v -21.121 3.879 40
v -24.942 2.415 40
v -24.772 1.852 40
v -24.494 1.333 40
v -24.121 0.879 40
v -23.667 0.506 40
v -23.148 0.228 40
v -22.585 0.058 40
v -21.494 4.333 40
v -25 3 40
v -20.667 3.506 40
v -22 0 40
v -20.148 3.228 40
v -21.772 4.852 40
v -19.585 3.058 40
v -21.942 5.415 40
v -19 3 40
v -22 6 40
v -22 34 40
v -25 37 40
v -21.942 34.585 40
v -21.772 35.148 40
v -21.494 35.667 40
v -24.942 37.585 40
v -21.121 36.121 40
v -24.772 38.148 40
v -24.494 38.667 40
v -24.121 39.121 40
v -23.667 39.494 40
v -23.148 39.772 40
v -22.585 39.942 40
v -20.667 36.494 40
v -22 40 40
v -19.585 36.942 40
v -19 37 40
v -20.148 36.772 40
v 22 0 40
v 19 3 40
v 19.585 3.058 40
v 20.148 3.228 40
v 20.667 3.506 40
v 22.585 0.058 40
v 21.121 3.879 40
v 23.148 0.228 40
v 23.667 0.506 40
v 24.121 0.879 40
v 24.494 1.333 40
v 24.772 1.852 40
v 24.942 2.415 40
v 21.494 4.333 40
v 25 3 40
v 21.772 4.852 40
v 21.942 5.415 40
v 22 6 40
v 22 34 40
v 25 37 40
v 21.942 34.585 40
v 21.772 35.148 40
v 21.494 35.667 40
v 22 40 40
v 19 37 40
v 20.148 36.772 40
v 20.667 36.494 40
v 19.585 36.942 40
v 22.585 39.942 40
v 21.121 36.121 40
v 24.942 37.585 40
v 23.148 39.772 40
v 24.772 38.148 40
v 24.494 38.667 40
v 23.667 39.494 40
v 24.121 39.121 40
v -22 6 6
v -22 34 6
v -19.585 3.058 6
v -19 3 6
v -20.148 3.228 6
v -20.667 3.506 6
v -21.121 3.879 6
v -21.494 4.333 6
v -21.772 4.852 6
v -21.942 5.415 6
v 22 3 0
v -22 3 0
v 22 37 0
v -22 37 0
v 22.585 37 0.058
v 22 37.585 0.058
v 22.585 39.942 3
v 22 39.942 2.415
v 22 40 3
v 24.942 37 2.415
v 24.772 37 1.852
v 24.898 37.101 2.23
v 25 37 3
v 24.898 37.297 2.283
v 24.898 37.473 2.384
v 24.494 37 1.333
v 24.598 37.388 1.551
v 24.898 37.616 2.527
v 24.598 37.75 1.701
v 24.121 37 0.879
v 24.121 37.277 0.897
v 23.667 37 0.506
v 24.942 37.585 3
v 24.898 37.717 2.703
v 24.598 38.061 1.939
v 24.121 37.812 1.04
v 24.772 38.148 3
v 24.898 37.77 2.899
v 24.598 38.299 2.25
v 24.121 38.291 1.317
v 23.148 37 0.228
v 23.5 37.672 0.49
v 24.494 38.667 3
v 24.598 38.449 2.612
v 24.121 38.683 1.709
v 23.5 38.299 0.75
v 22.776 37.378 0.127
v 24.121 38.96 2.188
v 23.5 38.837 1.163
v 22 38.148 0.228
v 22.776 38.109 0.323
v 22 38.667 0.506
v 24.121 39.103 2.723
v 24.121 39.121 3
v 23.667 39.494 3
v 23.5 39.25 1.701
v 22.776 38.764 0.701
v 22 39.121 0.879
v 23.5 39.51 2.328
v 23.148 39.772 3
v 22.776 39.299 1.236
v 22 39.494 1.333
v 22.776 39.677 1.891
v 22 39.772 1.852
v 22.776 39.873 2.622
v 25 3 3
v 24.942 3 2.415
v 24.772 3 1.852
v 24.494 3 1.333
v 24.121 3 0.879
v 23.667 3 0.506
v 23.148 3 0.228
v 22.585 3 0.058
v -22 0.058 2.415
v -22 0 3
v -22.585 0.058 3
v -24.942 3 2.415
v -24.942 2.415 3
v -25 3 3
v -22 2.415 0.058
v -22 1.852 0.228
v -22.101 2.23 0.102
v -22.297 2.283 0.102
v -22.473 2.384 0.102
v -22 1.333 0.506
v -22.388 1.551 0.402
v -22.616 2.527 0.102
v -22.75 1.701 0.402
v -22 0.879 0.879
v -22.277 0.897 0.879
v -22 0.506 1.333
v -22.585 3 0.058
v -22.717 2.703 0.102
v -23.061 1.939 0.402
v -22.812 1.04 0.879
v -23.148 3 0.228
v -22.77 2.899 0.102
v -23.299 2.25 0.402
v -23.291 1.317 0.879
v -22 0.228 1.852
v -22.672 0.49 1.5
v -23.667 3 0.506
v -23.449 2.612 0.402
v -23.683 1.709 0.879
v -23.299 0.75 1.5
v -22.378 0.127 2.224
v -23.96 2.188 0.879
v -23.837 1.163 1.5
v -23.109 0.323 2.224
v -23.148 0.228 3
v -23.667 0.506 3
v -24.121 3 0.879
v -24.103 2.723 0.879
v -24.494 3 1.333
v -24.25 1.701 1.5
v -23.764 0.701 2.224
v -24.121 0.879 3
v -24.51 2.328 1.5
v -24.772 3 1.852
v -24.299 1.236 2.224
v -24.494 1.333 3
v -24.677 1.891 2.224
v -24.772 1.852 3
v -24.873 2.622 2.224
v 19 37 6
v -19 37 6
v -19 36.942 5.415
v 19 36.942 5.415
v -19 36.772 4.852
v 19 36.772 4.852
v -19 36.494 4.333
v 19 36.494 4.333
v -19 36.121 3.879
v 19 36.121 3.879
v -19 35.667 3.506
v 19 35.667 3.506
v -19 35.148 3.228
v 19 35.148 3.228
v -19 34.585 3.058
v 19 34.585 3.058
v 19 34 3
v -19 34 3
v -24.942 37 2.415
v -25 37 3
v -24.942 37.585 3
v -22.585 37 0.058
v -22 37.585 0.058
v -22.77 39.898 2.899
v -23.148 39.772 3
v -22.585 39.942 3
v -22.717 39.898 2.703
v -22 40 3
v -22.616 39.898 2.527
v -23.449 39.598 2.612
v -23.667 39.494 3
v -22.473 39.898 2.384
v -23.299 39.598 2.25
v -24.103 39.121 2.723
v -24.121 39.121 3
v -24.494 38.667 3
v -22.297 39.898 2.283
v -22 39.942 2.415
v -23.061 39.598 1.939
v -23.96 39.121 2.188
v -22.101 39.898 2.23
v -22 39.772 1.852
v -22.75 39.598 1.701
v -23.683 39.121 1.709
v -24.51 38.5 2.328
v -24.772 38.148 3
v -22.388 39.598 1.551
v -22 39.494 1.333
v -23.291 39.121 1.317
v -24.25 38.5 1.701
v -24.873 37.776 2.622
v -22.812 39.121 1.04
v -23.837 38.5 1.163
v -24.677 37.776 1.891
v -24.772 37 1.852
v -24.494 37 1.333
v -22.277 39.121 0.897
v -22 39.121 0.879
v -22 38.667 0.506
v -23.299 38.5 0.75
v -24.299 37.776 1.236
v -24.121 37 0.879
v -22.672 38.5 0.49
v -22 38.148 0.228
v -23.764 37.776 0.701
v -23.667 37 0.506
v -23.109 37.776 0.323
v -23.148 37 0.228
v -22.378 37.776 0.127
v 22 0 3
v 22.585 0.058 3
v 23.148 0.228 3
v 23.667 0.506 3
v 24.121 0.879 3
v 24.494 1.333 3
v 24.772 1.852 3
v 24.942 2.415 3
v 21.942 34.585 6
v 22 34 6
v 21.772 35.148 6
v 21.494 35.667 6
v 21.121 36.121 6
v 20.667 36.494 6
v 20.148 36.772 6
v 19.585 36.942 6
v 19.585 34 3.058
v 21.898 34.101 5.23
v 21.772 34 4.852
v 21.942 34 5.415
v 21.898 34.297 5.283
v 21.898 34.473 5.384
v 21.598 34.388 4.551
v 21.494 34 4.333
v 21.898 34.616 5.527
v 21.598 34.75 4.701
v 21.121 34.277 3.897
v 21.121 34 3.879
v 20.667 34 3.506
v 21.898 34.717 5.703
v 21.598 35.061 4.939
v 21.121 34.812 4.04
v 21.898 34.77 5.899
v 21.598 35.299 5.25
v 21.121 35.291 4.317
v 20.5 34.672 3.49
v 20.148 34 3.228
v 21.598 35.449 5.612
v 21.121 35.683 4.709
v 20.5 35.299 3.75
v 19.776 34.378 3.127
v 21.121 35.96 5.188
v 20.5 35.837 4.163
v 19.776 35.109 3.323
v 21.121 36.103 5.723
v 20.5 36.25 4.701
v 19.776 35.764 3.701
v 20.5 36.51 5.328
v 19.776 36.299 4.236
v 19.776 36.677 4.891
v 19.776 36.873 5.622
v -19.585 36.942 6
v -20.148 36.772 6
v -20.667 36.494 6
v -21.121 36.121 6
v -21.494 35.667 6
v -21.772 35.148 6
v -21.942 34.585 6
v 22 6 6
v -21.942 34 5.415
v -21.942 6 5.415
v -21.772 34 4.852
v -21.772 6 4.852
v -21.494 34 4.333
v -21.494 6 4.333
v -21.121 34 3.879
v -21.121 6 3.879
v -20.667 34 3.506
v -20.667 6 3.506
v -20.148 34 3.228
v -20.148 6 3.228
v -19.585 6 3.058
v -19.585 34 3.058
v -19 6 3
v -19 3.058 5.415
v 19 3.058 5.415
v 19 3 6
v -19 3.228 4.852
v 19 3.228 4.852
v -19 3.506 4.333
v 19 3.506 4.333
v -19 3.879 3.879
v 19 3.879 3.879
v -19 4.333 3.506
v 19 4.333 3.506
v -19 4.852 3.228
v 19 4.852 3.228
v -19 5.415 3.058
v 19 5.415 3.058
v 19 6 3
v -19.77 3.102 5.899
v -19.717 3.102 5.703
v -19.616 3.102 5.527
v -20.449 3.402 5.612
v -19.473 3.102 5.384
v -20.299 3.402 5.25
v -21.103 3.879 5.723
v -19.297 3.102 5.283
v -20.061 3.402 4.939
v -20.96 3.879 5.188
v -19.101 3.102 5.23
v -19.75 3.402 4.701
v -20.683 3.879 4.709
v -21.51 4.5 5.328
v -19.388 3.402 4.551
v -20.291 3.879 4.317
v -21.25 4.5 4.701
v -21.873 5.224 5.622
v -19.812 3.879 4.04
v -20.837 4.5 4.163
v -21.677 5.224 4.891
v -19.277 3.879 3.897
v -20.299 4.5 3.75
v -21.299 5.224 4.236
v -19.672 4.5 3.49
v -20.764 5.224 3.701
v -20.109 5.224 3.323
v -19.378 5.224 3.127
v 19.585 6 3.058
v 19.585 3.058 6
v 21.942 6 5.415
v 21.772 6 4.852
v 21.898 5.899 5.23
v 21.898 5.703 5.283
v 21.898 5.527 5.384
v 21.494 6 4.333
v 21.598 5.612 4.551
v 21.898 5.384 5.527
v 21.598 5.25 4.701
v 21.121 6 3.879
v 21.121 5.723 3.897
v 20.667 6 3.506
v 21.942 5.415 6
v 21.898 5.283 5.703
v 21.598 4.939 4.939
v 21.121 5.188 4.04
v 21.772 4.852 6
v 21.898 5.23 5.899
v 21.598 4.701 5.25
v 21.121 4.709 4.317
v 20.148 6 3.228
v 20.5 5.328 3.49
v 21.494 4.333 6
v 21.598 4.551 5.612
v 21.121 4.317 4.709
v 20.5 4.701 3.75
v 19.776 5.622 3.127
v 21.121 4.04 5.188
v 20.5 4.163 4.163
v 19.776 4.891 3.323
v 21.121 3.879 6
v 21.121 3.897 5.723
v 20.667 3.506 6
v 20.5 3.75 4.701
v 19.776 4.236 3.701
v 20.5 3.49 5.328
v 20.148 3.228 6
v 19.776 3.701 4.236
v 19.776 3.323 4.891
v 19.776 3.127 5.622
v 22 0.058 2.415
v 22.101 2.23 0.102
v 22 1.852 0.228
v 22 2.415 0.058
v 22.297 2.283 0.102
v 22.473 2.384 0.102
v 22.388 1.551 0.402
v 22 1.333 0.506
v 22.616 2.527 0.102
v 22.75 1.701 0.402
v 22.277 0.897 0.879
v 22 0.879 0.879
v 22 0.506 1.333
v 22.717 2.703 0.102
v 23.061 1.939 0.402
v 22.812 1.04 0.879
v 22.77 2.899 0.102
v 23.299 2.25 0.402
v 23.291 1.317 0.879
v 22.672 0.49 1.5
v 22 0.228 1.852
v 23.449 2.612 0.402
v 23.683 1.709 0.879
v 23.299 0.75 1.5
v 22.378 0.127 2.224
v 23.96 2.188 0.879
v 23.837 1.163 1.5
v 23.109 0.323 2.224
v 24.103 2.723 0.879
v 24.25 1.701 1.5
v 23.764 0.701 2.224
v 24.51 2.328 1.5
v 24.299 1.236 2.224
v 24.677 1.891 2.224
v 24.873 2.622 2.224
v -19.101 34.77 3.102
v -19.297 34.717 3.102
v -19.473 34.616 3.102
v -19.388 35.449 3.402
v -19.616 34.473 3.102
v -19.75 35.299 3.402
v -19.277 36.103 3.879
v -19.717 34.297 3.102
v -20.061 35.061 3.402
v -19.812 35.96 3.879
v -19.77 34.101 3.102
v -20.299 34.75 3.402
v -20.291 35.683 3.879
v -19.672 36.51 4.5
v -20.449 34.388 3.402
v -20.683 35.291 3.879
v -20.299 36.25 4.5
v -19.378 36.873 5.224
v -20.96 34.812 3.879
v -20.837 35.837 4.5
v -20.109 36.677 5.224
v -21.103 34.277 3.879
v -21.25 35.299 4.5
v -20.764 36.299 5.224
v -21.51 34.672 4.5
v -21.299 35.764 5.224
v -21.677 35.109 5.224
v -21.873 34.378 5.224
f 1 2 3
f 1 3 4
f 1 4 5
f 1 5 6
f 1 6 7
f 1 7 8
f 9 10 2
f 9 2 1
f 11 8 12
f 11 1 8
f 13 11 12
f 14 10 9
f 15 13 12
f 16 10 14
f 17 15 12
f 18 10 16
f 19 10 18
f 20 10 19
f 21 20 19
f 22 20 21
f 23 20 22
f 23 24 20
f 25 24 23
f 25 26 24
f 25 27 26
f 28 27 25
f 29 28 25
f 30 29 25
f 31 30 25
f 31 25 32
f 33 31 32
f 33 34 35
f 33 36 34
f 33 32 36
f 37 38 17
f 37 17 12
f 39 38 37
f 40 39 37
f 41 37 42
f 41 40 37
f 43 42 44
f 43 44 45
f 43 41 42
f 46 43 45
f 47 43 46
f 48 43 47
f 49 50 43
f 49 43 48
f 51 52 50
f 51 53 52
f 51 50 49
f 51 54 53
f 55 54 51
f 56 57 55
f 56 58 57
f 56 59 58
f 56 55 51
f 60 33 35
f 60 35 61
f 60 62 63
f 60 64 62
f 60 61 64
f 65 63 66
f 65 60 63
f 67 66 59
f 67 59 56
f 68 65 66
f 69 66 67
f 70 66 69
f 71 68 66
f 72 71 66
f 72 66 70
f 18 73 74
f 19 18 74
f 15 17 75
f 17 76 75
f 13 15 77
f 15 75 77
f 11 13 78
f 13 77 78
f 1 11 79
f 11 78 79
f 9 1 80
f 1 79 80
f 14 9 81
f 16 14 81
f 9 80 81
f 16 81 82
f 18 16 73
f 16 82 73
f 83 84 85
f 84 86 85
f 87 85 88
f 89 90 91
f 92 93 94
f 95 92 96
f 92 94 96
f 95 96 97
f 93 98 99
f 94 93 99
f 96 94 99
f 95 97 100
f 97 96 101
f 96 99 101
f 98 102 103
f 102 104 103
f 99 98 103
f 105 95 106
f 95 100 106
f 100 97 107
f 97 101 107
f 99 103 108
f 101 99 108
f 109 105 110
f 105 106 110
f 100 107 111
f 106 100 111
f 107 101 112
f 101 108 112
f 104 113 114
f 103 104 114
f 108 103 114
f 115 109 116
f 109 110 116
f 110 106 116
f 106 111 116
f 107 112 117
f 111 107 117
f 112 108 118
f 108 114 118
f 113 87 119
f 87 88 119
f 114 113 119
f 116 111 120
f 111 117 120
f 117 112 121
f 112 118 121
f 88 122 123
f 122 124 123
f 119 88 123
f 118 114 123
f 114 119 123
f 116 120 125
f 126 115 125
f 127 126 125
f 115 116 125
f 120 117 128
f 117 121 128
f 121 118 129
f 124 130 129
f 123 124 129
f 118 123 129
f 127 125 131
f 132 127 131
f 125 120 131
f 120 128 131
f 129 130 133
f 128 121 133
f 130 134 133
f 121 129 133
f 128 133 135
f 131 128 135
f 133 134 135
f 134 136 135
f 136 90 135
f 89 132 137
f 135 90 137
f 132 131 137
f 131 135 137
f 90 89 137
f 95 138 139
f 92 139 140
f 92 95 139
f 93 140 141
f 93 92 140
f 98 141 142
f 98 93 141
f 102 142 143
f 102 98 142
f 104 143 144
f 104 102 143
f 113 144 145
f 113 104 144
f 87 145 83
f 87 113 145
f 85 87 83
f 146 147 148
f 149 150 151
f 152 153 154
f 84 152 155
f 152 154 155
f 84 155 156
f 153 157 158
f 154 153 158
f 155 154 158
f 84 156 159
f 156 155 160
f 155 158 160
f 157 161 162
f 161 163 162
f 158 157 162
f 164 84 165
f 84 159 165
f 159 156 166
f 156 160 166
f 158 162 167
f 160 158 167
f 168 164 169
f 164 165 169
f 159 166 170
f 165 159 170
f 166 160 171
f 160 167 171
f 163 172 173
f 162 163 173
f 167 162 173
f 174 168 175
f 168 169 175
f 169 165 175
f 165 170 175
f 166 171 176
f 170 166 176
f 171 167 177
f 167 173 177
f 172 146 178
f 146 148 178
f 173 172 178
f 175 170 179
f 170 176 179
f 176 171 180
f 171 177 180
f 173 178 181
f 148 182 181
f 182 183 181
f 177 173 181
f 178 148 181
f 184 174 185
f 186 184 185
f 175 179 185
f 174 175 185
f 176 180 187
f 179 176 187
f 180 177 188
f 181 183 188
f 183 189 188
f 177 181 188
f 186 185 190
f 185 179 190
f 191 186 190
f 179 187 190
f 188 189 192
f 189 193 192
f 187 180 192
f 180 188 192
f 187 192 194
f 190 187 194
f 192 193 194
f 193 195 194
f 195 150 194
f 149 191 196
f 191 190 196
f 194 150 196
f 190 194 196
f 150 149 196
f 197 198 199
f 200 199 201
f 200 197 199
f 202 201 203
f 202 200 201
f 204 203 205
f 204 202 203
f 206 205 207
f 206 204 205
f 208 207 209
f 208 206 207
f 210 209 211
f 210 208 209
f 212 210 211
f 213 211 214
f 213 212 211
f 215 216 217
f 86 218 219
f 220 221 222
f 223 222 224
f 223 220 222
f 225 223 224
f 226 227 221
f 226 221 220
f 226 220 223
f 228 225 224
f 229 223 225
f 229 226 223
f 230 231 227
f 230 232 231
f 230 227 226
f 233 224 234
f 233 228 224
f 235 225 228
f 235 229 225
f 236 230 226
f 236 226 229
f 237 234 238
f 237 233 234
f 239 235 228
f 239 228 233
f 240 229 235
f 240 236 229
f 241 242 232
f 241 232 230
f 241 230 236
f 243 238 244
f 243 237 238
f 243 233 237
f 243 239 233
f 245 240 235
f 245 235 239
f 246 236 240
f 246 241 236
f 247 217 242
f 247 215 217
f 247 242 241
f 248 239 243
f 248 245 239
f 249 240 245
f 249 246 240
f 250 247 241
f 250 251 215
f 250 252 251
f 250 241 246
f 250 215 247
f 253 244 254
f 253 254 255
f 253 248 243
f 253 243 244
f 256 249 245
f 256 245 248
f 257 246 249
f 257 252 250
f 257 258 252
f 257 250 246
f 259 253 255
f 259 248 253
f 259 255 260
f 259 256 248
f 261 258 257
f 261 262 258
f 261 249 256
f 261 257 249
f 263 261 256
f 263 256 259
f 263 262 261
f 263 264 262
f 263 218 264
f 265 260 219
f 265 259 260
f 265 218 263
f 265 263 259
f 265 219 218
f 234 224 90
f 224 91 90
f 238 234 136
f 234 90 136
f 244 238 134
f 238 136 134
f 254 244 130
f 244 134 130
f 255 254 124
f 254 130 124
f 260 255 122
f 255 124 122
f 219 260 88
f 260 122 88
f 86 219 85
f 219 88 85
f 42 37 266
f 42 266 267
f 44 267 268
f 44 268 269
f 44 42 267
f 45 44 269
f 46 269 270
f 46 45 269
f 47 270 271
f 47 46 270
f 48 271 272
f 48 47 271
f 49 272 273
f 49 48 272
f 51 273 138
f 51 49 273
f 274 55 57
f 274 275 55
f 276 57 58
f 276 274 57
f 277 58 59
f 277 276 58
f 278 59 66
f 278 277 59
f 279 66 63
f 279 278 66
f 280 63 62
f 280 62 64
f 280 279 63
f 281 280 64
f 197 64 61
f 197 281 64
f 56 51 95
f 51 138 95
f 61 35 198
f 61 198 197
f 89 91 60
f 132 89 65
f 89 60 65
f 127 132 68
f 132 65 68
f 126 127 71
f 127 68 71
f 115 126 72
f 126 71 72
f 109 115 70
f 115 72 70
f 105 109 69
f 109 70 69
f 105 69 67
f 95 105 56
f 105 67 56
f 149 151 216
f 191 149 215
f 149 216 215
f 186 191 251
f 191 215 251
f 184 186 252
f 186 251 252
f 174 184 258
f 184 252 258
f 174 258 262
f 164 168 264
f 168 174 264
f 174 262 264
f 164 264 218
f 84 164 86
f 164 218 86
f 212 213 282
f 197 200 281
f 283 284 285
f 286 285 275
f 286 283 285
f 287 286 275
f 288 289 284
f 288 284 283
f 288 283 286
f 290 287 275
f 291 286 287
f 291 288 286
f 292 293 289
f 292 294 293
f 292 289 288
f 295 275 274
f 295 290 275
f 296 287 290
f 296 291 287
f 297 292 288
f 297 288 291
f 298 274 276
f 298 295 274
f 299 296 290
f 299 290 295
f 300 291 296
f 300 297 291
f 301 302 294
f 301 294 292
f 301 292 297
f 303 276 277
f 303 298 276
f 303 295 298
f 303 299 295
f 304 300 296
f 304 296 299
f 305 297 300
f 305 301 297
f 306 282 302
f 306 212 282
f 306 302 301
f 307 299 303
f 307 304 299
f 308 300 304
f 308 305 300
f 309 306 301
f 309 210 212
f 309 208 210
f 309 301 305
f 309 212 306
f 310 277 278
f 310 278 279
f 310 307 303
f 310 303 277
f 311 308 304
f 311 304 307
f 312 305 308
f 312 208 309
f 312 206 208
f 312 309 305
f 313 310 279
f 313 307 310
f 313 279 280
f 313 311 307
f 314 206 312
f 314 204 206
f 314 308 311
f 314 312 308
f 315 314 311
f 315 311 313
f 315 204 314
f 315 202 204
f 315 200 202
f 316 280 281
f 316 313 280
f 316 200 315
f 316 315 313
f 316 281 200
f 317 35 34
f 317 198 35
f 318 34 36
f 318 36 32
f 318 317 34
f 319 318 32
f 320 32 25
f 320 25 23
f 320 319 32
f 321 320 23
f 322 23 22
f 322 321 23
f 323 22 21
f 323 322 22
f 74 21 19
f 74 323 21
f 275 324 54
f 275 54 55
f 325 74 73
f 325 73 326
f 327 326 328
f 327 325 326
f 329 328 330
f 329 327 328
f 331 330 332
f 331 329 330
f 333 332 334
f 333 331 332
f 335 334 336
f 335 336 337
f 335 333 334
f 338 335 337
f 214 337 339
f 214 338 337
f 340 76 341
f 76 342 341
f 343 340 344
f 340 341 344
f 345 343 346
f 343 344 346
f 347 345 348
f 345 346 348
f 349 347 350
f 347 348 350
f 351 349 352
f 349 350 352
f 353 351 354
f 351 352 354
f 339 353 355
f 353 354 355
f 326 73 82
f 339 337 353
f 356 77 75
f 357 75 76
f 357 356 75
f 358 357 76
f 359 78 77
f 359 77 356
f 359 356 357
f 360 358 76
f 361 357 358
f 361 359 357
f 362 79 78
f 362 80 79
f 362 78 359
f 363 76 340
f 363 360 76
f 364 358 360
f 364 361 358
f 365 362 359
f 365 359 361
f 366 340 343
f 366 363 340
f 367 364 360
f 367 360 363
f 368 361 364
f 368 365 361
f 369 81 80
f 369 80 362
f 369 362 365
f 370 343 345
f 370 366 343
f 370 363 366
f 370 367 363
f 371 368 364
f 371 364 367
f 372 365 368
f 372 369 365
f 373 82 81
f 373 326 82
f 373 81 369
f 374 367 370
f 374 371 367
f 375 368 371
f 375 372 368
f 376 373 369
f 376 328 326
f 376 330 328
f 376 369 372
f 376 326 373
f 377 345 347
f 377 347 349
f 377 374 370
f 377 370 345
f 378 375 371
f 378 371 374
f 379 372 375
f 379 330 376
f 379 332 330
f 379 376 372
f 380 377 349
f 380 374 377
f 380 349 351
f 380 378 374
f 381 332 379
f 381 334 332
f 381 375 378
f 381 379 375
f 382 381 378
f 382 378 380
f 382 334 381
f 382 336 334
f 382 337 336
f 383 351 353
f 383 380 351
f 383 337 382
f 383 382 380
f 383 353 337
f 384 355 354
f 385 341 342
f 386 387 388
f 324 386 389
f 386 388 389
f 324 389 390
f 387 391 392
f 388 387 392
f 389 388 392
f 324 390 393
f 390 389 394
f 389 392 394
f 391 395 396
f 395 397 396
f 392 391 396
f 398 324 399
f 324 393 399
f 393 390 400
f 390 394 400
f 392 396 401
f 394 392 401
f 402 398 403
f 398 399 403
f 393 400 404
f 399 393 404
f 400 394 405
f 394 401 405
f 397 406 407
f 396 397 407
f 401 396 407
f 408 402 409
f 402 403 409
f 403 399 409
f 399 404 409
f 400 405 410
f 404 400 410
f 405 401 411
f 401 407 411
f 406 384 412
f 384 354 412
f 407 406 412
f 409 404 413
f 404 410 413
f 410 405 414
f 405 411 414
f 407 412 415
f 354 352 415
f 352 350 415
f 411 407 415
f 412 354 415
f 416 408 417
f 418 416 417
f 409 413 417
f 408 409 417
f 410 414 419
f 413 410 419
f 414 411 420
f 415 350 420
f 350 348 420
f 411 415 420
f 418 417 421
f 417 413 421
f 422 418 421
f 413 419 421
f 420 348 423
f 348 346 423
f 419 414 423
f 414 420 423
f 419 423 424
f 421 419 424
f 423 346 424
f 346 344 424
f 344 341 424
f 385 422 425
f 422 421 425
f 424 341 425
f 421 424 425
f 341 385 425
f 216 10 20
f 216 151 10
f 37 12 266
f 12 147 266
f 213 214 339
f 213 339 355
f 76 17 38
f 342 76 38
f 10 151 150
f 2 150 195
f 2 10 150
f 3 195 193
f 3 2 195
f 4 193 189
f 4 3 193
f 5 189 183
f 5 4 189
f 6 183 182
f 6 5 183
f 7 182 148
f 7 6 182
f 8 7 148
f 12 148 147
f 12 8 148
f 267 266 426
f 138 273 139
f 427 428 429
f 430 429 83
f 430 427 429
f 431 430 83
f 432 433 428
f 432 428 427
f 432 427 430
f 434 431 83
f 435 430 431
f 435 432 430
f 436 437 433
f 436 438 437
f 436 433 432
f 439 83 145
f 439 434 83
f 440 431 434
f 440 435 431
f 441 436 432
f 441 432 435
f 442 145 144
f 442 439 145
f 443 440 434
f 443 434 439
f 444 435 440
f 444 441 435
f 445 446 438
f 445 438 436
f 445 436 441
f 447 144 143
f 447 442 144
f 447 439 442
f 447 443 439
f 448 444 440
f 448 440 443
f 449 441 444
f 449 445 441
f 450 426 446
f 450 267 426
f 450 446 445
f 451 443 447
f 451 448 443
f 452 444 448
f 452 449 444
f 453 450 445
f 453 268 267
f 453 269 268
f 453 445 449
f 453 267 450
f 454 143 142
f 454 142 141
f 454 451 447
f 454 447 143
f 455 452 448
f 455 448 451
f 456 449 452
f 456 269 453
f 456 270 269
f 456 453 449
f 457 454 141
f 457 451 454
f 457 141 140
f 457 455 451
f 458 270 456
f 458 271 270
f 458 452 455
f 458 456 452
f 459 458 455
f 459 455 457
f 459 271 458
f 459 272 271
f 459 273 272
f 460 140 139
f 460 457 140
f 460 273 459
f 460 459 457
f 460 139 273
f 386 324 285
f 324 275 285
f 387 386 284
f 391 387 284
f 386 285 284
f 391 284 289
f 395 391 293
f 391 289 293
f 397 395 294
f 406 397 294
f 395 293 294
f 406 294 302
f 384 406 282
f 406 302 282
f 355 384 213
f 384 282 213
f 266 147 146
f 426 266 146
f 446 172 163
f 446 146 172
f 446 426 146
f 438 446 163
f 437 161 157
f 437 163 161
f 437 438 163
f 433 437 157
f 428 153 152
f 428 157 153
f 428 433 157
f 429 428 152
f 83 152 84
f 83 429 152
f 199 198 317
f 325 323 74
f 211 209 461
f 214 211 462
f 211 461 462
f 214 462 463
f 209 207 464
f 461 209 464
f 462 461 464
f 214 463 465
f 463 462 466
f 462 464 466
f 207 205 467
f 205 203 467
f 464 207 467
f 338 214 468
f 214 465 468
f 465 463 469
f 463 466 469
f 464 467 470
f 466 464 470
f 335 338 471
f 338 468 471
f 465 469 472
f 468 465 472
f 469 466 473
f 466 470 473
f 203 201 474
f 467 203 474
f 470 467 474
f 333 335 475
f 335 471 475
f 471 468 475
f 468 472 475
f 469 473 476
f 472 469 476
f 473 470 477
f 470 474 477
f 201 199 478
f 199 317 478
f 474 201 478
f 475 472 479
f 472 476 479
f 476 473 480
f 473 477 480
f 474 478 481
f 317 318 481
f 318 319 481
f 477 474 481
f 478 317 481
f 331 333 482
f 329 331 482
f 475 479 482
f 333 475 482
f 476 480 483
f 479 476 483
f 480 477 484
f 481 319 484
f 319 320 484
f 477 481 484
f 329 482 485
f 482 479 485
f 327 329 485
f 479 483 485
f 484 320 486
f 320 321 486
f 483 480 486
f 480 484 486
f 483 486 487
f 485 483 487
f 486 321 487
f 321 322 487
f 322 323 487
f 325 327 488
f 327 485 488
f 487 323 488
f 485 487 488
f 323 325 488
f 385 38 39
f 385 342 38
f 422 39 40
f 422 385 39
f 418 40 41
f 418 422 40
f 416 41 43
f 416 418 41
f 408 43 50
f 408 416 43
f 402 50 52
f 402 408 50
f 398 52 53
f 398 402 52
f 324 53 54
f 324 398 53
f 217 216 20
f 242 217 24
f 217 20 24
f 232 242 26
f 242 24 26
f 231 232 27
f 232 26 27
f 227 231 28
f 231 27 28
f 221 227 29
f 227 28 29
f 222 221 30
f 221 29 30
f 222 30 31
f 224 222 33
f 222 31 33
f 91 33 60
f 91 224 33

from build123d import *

# Parameters (mm, degrees)
F0_W     = 50
F0_H     = 40
F1_DEPTH = 40
F2_W     = 44
F2_H     = 34
F3_DEPTH = 37
F4_R     = 3
F5_R     = 3


with BuildPart() as f1:
    # F0 (on Top) → F1 (new body)
    with BuildSketch(Plane.XY):
        with Locations((0, 20)):
            Rectangle(F0_W, F0_H)
    extrude(amount=F1_DEPTH)

    # F2 (on face) → F3 (cut)
    with BuildSketch(Plane.XY.offset(40)):
        with Locations((0, 20)):
            Rectangle(F2_W, F2_H)
    extrude(amount=-F3_DEPTH, mode=Mode.SUBTRACT)

    # F4
    f4_edges = [f1.edges().sort_by_distance(p)[0] for p in [
        (-22, 37, 21.5),
        (0, 37, 3),
        (-22, 20, 3),
        (-22, 3, 21.5),
        (0, 3, 3),
        (22, 20, 3),
        (22, 37, 21.5),
        (22, 3, 21.5),
    ]]
    fillet(f4_edges, radius=F4_R)

    # F5
    f5_edges = [f1.edges().sort_by_distance(p)[0] for p in [
        (-25, 0, 20),
        (25, 0, 20),
        (0, 0, 0),
        (-25, 20, 0),
        (-25, 40, 20),
        (0, 40, 0),
        (25, 20, 0),
        (25, 40, 20),
    ]]
    fillet(f5_edges, radius=F5_R)


solid = f1.part
